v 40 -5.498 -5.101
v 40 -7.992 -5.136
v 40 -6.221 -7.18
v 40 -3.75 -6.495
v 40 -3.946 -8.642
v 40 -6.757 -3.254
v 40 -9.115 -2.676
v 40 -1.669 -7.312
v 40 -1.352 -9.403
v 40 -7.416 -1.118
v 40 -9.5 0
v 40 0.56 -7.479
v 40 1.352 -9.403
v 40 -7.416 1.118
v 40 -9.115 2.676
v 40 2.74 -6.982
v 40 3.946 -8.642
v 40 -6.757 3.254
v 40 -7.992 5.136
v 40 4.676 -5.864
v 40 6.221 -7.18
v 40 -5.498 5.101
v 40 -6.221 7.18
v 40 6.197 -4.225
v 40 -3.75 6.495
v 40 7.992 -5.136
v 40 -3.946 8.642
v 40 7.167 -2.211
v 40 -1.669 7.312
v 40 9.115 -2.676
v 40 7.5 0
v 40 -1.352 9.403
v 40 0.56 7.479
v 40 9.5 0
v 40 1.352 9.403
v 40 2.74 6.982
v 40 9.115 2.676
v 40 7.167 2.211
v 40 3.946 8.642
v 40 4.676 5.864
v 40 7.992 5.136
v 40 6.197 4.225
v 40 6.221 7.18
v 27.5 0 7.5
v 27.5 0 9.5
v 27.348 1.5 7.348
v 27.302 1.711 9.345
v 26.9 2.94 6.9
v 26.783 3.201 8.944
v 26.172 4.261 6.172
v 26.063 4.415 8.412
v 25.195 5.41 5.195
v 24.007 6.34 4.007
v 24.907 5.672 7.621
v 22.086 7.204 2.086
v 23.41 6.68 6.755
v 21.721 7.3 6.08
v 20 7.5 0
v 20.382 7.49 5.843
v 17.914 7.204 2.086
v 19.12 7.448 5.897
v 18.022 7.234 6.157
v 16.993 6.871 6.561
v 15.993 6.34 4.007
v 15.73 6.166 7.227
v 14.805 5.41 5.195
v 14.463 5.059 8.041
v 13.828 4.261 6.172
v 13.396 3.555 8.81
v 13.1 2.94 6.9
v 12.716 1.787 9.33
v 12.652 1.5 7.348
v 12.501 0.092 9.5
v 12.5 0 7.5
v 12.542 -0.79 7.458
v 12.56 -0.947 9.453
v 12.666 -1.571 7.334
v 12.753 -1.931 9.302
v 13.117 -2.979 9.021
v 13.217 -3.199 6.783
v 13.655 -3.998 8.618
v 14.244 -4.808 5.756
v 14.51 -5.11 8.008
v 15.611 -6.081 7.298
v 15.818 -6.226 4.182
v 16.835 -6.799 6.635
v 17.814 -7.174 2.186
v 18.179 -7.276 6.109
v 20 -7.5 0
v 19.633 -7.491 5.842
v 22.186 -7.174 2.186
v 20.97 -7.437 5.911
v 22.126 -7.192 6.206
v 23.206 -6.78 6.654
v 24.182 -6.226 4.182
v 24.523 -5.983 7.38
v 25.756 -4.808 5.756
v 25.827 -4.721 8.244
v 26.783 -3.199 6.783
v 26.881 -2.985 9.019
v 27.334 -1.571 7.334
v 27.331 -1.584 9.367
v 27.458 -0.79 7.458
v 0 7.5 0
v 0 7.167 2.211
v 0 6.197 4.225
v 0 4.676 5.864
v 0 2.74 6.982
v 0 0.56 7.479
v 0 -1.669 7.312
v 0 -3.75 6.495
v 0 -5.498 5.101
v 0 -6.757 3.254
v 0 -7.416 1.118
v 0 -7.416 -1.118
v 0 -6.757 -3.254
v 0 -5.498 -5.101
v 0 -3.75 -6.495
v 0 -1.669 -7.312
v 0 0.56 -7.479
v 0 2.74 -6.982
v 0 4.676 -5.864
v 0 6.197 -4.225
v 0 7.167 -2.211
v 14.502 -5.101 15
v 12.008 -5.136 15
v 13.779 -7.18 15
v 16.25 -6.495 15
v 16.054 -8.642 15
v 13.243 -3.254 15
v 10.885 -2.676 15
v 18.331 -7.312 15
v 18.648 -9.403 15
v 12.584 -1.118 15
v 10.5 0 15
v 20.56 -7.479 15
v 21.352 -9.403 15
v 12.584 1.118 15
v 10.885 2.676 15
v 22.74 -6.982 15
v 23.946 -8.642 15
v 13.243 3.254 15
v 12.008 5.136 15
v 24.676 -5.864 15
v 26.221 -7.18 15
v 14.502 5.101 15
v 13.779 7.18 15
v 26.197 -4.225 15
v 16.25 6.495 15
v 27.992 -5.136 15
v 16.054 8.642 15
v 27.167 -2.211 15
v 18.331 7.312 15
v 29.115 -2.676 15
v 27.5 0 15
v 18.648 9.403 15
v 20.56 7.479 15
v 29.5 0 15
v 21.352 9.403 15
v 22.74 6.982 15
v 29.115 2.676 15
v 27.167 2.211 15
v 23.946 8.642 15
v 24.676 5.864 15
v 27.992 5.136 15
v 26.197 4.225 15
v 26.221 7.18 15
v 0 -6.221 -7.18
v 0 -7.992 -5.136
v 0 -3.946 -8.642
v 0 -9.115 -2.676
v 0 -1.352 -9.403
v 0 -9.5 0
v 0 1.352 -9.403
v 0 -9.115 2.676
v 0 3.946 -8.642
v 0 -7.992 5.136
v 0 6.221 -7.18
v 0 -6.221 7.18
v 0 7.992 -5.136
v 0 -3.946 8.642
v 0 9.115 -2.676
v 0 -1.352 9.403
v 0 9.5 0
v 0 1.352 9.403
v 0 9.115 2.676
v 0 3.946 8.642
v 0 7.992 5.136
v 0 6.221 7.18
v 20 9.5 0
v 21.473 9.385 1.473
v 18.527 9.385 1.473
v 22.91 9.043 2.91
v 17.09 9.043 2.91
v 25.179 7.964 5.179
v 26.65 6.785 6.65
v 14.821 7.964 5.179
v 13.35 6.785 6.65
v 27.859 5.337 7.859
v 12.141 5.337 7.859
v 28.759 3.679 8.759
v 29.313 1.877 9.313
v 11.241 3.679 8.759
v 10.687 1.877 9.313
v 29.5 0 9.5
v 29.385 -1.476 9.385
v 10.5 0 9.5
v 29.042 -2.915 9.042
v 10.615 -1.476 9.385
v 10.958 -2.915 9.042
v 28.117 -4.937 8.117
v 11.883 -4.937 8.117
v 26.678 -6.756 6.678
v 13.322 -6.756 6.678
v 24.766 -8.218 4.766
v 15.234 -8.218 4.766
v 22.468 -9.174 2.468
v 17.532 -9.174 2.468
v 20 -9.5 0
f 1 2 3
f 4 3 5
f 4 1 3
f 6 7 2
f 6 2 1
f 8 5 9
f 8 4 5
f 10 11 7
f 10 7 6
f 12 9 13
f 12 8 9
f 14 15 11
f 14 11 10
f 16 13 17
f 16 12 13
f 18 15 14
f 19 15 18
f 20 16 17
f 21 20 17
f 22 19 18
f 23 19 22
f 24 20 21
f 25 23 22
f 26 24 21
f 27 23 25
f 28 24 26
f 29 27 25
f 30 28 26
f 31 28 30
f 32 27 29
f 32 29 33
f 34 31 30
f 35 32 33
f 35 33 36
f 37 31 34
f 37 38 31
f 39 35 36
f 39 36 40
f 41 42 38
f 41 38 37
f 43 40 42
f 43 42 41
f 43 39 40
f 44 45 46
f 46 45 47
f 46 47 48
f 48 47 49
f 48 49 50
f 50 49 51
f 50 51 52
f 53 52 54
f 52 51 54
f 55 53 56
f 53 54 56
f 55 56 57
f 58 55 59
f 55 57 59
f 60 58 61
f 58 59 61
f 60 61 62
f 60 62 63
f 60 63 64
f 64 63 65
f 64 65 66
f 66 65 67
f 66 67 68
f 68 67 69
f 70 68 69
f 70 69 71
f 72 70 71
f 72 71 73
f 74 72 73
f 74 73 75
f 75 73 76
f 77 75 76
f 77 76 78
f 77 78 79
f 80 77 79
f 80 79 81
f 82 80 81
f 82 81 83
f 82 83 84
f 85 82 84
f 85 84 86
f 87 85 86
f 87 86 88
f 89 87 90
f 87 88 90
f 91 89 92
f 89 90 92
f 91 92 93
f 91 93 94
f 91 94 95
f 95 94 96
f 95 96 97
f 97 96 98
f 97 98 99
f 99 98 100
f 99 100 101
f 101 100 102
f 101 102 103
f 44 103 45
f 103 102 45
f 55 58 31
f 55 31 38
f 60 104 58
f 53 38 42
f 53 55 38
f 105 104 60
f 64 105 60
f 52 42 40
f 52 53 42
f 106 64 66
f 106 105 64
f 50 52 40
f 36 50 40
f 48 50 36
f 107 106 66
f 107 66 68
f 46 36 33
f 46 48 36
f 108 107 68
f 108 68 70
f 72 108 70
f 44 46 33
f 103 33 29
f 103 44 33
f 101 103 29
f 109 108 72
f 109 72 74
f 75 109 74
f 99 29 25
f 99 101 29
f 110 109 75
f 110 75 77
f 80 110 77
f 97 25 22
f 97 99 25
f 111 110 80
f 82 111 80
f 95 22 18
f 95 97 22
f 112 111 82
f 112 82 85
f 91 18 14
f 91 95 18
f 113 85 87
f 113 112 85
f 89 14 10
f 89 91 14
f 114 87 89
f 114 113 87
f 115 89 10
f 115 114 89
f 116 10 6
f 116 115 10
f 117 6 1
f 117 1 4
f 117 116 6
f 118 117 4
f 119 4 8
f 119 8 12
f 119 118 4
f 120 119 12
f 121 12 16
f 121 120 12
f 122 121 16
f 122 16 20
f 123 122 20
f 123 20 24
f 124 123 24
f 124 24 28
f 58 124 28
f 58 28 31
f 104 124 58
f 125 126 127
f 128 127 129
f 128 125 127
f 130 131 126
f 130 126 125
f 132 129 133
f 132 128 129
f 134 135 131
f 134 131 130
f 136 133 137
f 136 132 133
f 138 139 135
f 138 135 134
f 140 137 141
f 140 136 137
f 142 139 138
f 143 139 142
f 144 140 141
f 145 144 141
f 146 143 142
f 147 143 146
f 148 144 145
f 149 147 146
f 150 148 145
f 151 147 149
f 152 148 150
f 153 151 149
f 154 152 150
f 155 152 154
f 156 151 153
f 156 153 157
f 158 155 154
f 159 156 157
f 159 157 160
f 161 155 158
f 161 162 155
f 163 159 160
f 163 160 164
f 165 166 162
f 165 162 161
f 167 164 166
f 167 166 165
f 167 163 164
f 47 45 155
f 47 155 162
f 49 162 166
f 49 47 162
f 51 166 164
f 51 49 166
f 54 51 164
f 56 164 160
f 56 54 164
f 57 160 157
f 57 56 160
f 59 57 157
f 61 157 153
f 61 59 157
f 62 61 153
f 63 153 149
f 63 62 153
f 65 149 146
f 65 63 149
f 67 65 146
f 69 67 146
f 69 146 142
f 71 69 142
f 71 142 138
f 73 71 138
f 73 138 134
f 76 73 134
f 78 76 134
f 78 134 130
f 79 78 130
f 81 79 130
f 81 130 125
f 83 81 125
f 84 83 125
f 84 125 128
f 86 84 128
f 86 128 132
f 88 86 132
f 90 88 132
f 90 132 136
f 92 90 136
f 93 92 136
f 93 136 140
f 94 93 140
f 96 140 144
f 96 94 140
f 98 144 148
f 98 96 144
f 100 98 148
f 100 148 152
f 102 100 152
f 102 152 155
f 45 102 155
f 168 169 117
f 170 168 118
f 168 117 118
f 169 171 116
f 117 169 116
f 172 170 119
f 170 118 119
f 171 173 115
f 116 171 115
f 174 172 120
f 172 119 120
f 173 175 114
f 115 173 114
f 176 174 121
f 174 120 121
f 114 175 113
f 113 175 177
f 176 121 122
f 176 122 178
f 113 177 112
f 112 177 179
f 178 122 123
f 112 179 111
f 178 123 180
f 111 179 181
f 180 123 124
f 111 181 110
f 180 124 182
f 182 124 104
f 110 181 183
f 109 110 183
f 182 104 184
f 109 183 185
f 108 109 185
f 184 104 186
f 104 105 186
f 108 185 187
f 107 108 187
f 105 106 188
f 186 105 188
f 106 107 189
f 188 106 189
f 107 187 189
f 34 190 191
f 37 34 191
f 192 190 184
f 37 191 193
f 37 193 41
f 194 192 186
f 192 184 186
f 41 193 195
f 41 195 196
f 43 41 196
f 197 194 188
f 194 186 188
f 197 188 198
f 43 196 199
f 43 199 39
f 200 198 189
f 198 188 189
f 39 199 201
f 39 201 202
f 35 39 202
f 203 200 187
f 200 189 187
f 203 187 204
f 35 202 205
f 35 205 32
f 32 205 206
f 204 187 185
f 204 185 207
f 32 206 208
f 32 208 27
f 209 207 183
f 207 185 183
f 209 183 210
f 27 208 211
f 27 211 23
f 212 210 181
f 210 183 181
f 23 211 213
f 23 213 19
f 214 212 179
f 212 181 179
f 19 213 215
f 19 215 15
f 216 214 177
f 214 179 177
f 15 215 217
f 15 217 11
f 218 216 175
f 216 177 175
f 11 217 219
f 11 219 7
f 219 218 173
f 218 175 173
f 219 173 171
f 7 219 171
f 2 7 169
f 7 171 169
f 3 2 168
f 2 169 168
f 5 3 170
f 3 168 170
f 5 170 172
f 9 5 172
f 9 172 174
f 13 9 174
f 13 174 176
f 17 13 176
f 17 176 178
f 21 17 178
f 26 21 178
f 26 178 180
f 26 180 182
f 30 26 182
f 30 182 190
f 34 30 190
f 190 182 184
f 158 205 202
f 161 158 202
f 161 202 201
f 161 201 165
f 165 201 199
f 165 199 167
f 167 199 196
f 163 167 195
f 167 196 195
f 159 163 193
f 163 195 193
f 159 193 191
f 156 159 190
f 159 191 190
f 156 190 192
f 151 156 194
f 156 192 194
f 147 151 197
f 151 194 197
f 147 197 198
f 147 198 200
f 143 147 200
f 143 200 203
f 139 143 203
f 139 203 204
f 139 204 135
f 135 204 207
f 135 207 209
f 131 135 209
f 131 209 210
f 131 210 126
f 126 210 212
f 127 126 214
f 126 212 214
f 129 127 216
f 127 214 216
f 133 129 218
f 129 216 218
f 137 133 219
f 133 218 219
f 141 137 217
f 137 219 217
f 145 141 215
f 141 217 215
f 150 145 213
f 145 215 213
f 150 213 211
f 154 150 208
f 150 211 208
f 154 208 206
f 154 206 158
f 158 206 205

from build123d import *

# Parameters (mm, degrees)
F0_R     = 9.5
F0_R_2   = 7.5
F1_DEPTH = 40
F2_R     = 9.5
F2_R_2   = 7.5
F3_DEPTH = 15
F4_R     = 7.5
F5_DEPTH = 50
F6_R     = 7.5
F7_DEPTH = 15


with BuildPart() as f1:
    # F0 (on Right) → F1 (new body)
    with BuildSketch(Plane.YZ):
        Circle(F0_R)
        Circle(F0_R_2, mode=Mode.SUBTRACT)
    extrude(amount=F1_DEPTH)

    # F2 (on Top) → F3 (join)
    with BuildSketch(Plane.XY):
        with Locations((20, 0)):
            Circle(F2_R)
        with Locations((20, 0)):
            Circle(F2_R_2, mode=Mode.SUBTRACT)
    extrude(amount=F3_DEPTH)

    # F4 (on face) → F5 (cut)
    with BuildSketch(Plane.YZ.offset(40)):
        Circle(F4_R)
    extrude(amount=-F5_DEPTH, mode=Mode.SUBTRACT)

    # F6 (on face) → F7 (cut)
    with BuildSketch(Plane.XY.offset(15)):
        with Locations((20, 0)):
            Circle(F6_R)
    extrude(amount=-F7_DEPTH, mode=Mode.SUBTRACT)


solid = f1.part
